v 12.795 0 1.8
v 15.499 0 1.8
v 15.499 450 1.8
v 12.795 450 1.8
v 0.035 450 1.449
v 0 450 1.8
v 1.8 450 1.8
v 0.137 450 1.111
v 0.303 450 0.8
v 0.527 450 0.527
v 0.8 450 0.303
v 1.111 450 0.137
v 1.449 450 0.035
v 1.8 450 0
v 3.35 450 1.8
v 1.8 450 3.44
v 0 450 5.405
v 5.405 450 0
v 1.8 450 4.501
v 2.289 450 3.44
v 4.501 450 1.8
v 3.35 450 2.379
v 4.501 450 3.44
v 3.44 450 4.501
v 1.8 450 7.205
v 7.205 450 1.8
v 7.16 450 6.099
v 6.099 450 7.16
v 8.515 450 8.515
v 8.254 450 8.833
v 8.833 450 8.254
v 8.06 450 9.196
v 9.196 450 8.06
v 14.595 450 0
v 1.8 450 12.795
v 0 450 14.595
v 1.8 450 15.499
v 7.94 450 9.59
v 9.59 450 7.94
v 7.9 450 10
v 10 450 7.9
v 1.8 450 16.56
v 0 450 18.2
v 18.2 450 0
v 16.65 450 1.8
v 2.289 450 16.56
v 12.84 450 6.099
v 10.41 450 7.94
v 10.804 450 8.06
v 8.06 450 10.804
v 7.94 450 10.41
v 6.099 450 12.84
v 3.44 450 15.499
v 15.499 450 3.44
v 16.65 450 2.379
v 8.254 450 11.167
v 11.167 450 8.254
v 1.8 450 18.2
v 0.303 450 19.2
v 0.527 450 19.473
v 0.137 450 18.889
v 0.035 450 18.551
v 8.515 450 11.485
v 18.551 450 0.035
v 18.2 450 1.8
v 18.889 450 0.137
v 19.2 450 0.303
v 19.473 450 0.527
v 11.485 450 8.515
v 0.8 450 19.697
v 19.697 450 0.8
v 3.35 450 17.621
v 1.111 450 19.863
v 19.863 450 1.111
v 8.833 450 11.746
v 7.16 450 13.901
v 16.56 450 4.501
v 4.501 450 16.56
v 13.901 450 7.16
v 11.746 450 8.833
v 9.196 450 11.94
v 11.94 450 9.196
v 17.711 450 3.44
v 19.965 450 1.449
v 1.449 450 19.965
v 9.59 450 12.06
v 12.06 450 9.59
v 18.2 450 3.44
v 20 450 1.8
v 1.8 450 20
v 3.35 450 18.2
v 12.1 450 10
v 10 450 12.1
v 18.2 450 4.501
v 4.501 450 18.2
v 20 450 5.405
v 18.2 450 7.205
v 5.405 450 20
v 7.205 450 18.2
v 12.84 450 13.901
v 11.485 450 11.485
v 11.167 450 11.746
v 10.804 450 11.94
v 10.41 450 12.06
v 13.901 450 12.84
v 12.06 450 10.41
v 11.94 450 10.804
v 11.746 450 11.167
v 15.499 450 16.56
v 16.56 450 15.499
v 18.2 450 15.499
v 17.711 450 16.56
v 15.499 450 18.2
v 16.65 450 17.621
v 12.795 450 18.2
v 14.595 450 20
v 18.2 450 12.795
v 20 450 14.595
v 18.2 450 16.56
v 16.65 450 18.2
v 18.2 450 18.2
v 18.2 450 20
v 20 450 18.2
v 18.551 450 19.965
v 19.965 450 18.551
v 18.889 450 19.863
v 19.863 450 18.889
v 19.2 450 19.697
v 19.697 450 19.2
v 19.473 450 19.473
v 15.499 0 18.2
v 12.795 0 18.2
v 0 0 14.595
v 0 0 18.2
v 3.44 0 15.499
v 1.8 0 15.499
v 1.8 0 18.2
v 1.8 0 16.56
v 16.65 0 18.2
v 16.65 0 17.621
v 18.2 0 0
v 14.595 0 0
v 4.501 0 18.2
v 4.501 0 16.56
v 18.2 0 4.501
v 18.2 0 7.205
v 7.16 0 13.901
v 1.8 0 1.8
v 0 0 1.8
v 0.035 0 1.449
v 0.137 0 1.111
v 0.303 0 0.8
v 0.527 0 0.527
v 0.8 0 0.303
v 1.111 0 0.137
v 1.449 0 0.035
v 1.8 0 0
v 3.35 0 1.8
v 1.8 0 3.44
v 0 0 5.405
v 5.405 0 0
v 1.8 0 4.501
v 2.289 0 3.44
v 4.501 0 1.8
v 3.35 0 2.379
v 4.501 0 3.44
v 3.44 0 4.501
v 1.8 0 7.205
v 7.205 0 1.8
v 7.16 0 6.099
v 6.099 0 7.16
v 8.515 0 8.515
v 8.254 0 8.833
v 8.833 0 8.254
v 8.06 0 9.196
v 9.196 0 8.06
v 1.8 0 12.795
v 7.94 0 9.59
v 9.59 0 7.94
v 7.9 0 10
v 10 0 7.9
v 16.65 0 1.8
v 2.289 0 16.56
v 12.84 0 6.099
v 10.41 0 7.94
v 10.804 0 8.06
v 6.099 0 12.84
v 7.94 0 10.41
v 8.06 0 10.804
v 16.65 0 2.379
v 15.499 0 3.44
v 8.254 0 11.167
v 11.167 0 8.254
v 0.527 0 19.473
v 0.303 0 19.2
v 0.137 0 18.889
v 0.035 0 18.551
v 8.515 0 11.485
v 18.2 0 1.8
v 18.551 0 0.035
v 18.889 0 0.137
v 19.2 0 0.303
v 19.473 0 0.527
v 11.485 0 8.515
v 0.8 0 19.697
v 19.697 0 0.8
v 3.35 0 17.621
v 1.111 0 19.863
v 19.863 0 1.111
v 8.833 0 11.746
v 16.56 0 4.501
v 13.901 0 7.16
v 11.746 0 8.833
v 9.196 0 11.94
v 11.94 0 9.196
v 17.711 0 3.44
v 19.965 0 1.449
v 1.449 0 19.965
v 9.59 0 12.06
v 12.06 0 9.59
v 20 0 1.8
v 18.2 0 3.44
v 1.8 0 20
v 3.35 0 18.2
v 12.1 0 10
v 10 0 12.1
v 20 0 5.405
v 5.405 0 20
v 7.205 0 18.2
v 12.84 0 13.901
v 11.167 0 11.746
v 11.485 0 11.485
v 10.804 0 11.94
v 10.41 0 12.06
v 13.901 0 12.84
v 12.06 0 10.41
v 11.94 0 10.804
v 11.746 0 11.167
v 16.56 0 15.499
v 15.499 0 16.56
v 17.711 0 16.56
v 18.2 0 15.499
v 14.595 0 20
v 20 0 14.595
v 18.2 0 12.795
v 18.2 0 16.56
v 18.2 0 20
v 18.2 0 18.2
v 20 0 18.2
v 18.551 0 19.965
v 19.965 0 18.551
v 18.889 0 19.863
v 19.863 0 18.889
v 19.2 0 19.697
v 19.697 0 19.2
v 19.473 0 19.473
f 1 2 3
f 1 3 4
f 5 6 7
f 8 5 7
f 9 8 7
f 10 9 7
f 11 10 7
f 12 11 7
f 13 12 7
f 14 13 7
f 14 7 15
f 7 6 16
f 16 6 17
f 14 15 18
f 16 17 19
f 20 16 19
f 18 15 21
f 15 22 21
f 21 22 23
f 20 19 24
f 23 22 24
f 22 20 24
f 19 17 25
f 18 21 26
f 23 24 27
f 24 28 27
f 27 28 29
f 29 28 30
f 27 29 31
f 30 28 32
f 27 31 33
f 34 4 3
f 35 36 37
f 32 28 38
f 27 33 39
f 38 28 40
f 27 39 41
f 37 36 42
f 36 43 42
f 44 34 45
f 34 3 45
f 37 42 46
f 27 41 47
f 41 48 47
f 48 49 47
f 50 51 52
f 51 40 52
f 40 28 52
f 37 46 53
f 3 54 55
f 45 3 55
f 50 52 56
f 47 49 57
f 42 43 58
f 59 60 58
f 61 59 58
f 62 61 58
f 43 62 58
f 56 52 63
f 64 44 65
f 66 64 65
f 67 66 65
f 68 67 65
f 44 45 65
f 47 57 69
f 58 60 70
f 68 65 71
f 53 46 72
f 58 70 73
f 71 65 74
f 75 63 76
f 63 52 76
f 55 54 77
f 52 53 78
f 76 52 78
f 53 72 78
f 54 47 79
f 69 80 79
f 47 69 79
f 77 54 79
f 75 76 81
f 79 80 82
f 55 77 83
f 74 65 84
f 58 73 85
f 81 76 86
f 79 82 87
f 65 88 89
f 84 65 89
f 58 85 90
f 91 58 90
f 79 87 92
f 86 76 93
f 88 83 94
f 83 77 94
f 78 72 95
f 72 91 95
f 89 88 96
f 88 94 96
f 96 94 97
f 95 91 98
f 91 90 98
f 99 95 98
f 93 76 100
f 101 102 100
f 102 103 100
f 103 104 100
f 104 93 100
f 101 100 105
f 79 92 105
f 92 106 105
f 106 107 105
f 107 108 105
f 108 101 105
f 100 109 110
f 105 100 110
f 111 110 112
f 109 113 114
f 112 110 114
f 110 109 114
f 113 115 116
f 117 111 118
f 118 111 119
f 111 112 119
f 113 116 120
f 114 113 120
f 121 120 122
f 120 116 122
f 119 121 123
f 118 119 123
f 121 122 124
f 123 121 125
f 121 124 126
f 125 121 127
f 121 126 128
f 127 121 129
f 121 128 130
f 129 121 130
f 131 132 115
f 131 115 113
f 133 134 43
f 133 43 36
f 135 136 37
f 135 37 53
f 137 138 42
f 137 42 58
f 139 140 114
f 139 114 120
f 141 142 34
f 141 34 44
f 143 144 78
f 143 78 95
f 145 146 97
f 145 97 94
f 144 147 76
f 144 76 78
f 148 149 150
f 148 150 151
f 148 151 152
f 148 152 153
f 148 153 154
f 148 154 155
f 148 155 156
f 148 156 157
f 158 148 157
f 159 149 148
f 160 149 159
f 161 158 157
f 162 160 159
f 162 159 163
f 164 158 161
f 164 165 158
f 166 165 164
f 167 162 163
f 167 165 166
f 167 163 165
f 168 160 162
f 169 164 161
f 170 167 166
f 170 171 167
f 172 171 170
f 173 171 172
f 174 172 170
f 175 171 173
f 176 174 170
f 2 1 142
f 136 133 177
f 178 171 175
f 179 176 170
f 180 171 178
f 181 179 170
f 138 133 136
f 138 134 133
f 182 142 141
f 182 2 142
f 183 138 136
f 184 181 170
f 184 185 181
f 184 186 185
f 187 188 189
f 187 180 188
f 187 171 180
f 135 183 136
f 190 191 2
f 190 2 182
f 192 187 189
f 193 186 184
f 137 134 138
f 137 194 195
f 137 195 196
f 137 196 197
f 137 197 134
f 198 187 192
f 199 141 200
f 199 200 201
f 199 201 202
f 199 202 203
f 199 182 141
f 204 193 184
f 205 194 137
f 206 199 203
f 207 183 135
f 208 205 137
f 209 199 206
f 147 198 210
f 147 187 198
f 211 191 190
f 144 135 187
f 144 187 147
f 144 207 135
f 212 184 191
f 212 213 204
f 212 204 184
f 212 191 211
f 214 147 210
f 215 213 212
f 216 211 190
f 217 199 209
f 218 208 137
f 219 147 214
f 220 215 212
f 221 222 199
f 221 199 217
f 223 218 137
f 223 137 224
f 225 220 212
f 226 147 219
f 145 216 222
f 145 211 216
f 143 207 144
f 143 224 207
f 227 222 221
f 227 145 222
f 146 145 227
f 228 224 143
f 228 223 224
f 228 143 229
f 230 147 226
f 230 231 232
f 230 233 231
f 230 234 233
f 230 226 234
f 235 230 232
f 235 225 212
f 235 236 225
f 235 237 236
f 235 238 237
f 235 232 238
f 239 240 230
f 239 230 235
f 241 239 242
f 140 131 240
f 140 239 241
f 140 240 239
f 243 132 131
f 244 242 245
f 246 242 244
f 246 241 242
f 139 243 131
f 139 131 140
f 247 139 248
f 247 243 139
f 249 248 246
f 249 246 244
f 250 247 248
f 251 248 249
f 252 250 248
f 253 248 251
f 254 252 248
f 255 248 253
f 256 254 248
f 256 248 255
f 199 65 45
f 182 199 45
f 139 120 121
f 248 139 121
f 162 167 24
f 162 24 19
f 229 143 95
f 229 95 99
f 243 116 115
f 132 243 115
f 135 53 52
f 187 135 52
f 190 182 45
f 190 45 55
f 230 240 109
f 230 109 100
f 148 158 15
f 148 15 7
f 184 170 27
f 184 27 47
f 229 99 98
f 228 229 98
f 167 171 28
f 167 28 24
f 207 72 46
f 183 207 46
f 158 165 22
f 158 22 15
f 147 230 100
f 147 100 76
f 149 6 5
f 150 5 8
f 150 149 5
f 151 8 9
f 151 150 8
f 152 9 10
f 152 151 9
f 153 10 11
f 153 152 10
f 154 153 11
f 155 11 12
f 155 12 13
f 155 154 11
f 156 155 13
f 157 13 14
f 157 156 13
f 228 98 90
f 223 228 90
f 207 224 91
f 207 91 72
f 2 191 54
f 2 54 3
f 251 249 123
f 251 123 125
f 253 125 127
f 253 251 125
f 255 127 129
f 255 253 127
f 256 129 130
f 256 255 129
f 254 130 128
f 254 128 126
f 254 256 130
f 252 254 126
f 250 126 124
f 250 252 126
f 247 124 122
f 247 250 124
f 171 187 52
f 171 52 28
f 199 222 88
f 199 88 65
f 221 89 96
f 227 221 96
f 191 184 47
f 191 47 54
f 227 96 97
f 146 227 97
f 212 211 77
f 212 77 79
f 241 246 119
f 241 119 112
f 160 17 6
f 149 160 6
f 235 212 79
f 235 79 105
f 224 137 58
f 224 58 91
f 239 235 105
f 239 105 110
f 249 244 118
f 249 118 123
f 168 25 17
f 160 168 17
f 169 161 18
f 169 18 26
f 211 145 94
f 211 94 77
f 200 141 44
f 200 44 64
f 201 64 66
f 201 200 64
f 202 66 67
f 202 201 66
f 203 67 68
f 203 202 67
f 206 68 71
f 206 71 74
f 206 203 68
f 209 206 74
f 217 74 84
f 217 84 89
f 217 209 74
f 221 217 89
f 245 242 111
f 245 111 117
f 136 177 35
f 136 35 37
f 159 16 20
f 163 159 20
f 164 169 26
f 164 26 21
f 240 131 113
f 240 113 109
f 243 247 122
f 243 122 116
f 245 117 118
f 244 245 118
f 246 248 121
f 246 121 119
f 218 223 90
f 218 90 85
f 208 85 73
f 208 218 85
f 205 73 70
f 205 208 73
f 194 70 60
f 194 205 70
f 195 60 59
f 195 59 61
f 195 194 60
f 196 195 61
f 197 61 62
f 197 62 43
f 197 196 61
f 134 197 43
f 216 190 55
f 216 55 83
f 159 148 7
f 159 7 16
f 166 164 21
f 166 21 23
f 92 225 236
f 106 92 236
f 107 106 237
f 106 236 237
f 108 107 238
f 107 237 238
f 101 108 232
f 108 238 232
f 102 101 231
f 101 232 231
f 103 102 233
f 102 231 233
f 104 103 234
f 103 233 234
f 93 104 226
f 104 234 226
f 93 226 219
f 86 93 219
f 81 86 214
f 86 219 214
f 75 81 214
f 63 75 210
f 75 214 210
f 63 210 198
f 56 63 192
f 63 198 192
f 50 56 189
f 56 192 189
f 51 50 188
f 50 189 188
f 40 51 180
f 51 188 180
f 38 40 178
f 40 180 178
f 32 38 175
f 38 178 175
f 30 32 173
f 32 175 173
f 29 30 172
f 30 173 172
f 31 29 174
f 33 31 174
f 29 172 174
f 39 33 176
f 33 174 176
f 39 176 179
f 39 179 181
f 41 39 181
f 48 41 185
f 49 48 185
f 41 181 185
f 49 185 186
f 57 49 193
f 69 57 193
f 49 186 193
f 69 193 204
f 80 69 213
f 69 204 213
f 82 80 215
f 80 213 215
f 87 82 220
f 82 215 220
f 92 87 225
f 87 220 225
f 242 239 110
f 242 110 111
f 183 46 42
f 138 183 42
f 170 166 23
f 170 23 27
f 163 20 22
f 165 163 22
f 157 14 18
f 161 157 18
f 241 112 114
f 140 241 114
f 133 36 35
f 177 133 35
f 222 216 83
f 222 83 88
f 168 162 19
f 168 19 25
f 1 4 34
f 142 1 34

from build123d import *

# Parameters (mm, degrees)
F0_R     = 2.1
F1_DEPTH = 450


with BuildPart() as f1:
    # F0 (on Front) → F1 (new body)
    with BuildSketch(Plane.XZ):
        with BuildLine():
            Line((4.50066, 1.8), (4.50066, 3.44))
            Line((4.50066, 3.44), (7.16, 6.09934))
            Line((7.16, 6.09934), (12.84, 6.09934))
            Line((12.84, 6.09934), (15.49934, 3.44))
            Line((15.49934, 3.44), (15.49934, 1.8))
            Line((15.49934, 1.8), (12.795146, 1.8))
            Line((12.795146, 1.8), (14.595146, 0))
            Line((14.595146, 0), (18.2, 0))
            ThreePointArc((18.2, 0), (19.472792, 0.527208), (20, 1.8))
            Line((20, 1.8), (20, 5.404854))
            Line((20, 5.404854), (18.2, 7.204854))
            Line((18.2, 7.204854), (18.2, 4.50066))
            Line((18.2, 4.50066), (16.56, 4.50066))
            Line((16.56, 4.50066), (13.90066, 7.16))
            Line((13.90066, 7.16), (13.90066, 12.84))
            Line((13.90066, 12.84), (16.56, 15.49934))
            Line((16.56, 15.49934), (18.2, 15.49934))
            Line((18.2, 15.49934), (18.2, 12.795146))
            Line((18.2, 12.795146), (20, 14.595146))
            Line((20, 14.595146), (20, 18.2))
            ThreePointArc((20, 18.2), (19.472792, 19.472792), (18.2, 20))
            Line((18.2, 20), (14.595146, 20))
            Line((14.595146, 20), (12.795146, 18.2))
            Line((12.795146, 18.2), (15.49934, 18.2))
            Line((15.49934, 18.2), (15.49934, 16.56))
            Line((15.49934, 16.56), (12.84, 13.90066))
            Line((12.84, 13.90066), (7.16, 13.90066))
            Line((7.16, 13.90066), (4.50066, 16.56))
            Line((4.50066, 16.56), (4.50066, 18.2))
            Line((4.50066, 18.2), (7.204854, 18.2))
            Line((7.204854, 18.2), (5.404854, 20))
            Line((5.404854, 20), (1.8, 20))
            ThreePointArc((1.8, 20), (0.527208, 19.472792), (0, 18.2))
            Line((0, 18.2), (0, 14.595146))
            Line((0, 14.595146), (1.8, 12.795146))
            Line((1.8, 12.795146), (1.8, 15.49934))
            Line((1.8, 15.49934), (3.44, 15.49934))
            Line((3.44, 15.49934), (6.09934, 12.84))
            Line((6.09934, 12.84), (6.09934, 7.16))
            Line((6.09934, 7.16), (3.44, 4.50066))
            Line((3.44, 4.50066), (1.8, 4.50066))
            Line((1.8, 4.50066), (1.8, 7.204854))
            Line((1.8, 7.204854), (0, 5.404854))
            Line((0, 5.404854), (0, 1.8))
            ThreePointArc((0, 1.8), (0.527208, 0.527208), (1.8, 0))
            Line((1.8, 0), (5.404854, 0))
            Line((5.404854, 0), (7.204854, 1.8))
            Line((7.204854, 1.8), (4.50066, 1.8))
        make_face()
        Polygon((2.288858, 3.44), (3.349518, 2.37934), (3.349518, 1.8), (1.8, 1.8), (1.8, 3.44), align=None, mode=Mode.SUBTRACT)
        Polygon((18.2, 3.44), (18.2, 1.8), (16.650482, 1.8), (16.650482, 2.37934), (17.711142, 3.44), align=None, mode=Mode.SUBTRACT)
        with Locations((10, 10)):
            Circle(F0_R, mode=Mode.SUBTRACT)
        Polygon((1.8, 16.56), (1.8, 18.2), (3.349518, 18.2), (3.349518, 17.62066), (2.288858, 16.56), align=None, mode=Mode.SUBTRACT)
        Polygon((17.711142, 16.56), (16.650482, 17.62066), (16.650482, 18.2), (18.2, 18.2), (18.2, 16.56), align=None, mode=Mode.SUBTRACT)
    extrude(amount=-F1_DEPTH)


solid = f1.part
